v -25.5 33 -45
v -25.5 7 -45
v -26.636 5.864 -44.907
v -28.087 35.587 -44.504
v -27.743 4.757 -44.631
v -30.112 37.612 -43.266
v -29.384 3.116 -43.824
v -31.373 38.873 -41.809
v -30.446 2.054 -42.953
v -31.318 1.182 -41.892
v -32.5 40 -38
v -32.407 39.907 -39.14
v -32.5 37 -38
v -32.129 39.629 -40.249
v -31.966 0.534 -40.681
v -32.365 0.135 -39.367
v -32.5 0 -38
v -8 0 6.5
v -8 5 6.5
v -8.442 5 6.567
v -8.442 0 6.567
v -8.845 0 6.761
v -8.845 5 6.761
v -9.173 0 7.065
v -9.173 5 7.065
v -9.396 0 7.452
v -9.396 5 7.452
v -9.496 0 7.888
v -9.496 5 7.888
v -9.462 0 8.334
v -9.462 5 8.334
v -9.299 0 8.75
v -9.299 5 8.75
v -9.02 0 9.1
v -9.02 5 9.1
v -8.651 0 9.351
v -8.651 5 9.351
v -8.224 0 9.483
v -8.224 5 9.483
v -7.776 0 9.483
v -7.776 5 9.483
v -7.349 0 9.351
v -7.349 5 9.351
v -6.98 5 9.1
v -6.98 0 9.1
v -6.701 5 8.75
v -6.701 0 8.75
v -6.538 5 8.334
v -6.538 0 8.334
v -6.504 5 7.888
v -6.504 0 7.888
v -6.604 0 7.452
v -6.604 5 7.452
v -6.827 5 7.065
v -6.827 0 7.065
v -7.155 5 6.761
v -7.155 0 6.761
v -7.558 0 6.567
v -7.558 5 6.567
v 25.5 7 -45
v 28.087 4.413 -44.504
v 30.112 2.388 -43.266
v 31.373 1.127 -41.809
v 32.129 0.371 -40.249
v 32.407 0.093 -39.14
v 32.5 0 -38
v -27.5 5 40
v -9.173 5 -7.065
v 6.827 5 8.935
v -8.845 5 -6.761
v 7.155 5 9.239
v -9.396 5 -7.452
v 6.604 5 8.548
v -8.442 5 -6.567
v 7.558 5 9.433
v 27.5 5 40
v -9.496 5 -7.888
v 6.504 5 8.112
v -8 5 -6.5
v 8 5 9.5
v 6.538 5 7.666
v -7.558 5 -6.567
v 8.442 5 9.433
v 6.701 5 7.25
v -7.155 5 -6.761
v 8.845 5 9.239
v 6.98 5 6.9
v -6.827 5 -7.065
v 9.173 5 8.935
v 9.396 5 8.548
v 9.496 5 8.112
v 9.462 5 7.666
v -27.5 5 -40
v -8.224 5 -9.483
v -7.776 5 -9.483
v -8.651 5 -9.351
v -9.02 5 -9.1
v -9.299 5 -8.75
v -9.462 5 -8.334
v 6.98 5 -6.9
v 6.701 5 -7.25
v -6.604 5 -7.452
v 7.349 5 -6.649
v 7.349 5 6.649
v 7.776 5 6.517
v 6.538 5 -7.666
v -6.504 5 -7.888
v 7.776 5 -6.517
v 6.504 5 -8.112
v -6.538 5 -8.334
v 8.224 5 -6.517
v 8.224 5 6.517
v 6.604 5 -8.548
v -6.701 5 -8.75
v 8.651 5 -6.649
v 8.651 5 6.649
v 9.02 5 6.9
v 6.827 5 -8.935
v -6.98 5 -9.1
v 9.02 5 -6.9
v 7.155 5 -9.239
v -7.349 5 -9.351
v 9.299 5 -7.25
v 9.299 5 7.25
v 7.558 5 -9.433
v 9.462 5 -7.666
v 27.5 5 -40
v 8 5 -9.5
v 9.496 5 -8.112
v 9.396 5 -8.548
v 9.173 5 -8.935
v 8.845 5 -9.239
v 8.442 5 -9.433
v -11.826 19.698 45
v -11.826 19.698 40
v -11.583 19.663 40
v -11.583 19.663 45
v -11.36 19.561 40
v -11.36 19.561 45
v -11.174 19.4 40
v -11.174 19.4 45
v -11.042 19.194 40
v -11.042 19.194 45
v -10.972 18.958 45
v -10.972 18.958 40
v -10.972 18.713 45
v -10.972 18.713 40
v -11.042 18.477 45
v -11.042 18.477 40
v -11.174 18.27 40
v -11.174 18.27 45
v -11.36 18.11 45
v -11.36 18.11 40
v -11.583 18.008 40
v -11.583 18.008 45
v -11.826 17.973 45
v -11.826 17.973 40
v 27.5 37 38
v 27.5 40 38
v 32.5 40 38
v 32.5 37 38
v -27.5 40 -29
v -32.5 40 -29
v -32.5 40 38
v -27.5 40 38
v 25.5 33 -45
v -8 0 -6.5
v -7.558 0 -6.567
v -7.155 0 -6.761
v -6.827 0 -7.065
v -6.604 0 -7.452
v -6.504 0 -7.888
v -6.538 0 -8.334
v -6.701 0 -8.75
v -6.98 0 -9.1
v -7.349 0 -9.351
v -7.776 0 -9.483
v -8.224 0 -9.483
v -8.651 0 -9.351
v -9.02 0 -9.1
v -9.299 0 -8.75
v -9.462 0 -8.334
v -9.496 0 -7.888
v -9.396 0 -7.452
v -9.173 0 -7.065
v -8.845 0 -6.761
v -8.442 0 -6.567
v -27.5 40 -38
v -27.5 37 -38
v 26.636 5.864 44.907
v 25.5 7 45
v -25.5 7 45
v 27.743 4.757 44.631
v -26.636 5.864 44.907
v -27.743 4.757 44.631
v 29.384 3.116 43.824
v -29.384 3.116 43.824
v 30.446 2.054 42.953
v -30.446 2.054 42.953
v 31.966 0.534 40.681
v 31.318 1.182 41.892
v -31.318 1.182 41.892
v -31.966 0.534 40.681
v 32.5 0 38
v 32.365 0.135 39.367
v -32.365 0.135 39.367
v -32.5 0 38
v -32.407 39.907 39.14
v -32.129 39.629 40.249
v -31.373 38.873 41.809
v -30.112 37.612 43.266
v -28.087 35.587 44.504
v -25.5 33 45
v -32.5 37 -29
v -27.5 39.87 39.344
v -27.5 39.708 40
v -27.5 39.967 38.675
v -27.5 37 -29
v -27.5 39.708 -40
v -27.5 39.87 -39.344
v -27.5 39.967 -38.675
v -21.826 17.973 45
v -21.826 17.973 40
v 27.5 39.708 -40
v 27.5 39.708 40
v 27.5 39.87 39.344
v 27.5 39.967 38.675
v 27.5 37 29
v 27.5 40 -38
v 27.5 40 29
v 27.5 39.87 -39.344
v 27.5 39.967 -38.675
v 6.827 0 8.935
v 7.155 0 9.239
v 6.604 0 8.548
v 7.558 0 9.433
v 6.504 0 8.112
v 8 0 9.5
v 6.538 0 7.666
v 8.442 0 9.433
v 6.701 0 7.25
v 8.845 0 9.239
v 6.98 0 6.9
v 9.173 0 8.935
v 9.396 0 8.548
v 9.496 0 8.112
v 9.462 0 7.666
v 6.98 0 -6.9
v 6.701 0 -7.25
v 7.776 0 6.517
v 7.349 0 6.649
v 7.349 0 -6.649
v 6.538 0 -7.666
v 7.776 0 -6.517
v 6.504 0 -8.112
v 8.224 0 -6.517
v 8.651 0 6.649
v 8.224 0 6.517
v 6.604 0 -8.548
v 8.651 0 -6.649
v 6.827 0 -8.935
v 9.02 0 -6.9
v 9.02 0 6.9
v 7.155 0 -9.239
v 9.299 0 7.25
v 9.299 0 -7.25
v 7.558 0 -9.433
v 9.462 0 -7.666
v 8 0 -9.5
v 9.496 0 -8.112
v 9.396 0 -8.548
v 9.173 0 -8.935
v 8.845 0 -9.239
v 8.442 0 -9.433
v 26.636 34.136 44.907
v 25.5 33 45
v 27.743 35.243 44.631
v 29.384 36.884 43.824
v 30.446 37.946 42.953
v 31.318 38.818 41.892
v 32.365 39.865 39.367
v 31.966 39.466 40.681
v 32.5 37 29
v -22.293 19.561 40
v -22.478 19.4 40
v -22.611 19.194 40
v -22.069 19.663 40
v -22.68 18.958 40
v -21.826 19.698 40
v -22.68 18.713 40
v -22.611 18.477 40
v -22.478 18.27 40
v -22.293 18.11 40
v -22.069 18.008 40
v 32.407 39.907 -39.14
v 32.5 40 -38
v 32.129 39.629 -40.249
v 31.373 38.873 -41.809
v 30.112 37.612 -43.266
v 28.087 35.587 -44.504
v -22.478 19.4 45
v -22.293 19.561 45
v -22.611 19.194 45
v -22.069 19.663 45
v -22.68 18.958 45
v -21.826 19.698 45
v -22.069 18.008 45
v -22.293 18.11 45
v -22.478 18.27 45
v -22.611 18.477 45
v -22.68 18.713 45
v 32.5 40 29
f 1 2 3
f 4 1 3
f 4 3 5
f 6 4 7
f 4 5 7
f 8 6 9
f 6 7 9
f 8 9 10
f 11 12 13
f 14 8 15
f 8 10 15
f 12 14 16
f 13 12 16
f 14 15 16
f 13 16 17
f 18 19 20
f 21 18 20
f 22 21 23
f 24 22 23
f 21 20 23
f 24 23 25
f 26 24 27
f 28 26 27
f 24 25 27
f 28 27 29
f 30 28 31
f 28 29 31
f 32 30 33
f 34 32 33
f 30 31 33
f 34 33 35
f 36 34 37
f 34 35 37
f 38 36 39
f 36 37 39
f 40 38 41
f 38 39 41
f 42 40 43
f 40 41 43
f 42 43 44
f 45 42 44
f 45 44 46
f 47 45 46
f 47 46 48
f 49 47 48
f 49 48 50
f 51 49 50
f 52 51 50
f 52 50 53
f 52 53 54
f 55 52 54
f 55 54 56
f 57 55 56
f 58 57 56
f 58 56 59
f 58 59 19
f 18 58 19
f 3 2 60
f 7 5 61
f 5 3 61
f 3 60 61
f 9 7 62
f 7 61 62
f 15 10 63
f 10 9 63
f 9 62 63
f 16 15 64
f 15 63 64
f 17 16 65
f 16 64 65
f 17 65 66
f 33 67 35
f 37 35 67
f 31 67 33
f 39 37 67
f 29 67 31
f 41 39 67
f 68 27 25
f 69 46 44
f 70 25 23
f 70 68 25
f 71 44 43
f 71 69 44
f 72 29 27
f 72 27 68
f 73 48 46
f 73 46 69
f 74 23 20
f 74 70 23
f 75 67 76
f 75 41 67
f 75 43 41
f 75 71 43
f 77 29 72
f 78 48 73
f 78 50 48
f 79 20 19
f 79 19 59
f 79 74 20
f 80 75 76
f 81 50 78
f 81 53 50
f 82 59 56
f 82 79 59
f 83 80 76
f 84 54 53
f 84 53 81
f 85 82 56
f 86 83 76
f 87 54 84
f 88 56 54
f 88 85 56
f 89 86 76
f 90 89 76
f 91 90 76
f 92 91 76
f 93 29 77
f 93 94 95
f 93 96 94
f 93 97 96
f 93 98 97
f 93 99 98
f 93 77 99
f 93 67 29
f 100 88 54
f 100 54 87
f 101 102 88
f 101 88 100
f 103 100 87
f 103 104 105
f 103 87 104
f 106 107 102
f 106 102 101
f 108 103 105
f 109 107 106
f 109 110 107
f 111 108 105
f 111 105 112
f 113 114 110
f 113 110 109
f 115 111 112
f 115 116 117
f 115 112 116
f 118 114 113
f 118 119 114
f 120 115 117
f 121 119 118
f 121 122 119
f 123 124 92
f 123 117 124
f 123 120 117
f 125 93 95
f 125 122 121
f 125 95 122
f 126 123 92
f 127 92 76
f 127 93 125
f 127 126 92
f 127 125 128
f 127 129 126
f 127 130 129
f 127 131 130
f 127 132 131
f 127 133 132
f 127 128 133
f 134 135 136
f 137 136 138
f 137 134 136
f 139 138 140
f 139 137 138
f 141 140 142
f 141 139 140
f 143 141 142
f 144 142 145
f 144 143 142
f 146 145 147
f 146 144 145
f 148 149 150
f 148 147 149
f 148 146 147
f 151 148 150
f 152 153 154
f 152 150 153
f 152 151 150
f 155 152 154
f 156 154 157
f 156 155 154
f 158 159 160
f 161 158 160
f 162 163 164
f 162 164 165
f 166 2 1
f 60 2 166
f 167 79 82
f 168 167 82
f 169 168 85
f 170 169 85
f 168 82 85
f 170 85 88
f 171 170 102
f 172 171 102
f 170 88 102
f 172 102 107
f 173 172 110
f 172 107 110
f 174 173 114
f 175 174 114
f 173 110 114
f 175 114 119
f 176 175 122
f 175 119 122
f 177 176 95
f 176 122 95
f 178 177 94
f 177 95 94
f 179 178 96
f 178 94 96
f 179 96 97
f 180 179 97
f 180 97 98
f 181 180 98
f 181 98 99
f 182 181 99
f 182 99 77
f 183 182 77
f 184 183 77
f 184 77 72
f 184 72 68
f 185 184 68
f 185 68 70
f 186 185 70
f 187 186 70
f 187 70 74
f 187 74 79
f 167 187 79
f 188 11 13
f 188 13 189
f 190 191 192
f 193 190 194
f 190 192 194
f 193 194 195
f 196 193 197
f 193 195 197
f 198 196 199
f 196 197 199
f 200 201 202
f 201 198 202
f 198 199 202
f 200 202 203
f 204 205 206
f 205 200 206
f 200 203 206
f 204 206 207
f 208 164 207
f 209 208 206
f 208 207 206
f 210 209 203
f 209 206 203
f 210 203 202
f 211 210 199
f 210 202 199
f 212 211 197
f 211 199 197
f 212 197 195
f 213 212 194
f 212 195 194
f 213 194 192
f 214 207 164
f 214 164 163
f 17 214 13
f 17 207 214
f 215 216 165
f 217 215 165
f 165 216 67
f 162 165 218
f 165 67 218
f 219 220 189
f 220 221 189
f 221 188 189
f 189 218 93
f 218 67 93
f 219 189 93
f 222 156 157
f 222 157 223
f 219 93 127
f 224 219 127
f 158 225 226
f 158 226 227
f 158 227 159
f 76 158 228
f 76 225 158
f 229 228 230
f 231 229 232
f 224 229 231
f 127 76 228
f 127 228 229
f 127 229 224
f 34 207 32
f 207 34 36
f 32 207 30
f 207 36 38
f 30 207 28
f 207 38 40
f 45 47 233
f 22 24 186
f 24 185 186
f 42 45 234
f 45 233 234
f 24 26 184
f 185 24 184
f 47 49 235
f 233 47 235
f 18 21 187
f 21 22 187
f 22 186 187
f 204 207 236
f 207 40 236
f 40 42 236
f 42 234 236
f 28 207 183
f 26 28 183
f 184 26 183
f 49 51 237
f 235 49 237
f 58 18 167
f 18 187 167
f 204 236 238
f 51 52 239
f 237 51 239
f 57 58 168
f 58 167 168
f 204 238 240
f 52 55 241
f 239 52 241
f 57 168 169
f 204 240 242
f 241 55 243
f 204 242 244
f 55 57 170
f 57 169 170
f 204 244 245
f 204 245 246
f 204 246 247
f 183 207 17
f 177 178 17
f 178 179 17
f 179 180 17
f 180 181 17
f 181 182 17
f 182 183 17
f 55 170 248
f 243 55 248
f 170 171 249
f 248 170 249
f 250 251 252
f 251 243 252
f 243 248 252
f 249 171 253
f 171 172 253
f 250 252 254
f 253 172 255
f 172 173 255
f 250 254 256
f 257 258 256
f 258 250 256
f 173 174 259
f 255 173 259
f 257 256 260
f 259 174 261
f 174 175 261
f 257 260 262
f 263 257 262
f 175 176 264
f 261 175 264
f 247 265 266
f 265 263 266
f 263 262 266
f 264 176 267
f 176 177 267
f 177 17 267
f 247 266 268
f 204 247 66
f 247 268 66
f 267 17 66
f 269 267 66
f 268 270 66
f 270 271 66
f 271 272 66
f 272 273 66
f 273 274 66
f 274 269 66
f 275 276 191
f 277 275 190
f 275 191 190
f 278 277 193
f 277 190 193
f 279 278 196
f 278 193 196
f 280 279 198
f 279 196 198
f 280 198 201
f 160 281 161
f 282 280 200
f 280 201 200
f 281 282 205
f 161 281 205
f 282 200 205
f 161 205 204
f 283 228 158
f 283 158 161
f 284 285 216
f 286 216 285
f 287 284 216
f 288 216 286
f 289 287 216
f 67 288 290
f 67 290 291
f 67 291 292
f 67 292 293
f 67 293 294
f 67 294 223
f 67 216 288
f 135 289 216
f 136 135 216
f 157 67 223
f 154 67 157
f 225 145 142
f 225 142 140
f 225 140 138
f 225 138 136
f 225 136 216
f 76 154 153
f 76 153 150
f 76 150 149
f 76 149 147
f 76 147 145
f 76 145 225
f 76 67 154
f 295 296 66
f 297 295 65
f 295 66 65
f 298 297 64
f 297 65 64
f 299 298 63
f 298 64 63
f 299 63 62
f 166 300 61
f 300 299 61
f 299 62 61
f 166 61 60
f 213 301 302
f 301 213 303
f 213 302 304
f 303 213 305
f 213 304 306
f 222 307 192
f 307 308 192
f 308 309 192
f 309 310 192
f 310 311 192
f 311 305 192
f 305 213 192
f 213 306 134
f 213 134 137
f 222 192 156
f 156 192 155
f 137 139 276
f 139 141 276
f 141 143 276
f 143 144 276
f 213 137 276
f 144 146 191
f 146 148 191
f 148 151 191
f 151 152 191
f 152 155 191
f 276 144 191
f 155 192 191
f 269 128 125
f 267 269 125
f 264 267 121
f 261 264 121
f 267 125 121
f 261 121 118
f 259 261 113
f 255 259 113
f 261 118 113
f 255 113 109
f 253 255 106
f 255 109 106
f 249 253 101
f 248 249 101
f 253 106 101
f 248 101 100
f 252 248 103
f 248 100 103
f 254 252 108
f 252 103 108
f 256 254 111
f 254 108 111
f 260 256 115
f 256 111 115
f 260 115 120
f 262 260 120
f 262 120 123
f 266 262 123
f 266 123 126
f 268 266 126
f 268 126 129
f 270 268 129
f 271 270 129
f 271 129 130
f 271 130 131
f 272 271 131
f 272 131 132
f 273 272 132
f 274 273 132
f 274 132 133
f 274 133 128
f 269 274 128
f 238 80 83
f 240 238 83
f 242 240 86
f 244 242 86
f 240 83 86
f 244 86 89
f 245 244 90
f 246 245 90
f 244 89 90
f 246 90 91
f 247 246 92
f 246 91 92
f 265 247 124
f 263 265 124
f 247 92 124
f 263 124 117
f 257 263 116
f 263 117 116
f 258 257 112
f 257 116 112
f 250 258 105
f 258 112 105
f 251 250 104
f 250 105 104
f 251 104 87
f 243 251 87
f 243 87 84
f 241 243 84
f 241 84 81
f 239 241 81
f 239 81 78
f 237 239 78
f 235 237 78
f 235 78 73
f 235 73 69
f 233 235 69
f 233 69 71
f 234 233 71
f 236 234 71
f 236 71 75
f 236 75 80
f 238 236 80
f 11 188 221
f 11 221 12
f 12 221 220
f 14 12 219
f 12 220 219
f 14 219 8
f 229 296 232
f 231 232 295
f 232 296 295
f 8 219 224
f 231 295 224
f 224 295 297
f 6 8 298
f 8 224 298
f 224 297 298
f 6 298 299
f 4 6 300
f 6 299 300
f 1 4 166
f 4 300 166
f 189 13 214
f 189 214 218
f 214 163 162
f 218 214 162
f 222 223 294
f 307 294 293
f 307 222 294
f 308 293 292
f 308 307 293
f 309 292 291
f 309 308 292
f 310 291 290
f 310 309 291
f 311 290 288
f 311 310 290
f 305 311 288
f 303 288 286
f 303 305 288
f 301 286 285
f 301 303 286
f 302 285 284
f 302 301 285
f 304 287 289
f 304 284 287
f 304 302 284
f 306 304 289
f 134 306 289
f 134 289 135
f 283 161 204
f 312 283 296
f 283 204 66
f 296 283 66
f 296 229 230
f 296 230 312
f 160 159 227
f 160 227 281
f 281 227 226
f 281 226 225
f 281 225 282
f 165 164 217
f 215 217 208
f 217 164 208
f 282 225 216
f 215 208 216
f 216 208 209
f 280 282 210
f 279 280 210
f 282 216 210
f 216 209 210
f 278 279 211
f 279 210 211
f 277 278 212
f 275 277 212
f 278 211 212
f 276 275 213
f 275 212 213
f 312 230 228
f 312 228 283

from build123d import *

# Parameters (mm, degrees)
ESBO_O3_W                = 65
ESBO_O3_H                = 90
RESSALTO_EXTRUS_O2_DEPTH = 40
CASCA2_T                 = -5
ESBO_O4_R                = 1.5
CORTE_EXTRUS_O1_DEPTH    = 40
FILETE2_R                = 7
ESBO_O5_W                = 5
ESBO_O5_H                = 9
CORTE_EXTRUS_O2_DEPTH    = 3
ESBO_O7_W                = 5
ESBO_O7_H                = 9
CORTE_EXTRUS_O3_DEPTH    = 3
CORTE_EXTRUS_O4_REACH    = 105.712


with BuildPart() as part:
    # Esboço3 → Ressalto-extrusão2 (new body)
    with BuildSketch(Plane(origin=(0, 0, 0), x_dir=(1, 0, 0), z_dir=(0, 1, 0))):
        Rectangle(ESBO_O3_W, ESBO_O3_H)
    extrude(amount=RESSALTO_EXTRUS_O2_DEPTH)

    # Casca2
    casca2_openings = [part.faces().sort_by_distance(p)[0] for p in [
        (0, 40, 0),
    ]]
    offset(amount=CASCA2_T, openings=casca2_openings, kind=Kind.INTERSECTION)

    # Esboço4 → Corte-extrusão1 (cut)
    with BuildSketch(Plane(origin=(0, 5, 0), x_dir=(1, 0, 0), z_dir=(0, 1, 0))):
        with Locations(Location((-8, 8, 0), (0, 0, 270))):
            Circle(ESBO_O4_R)
        with Locations(Location((8, 8, 0), (0, 0, 90))):
            Circle(ESBO_O4_R)
        with Locations(Location((8, -8, 0), (0, 0, 270))):
            Circle(ESBO_O4_R)
        with Locations(Location((-8, -8, 0), (0, 0, 90))):
            Circle(ESBO_O4_R)
    extrude(amount=-CORTE_EXTRUS_O1_DEPTH, mode=Mode.SUBTRACT)

    # Filete2
    # the kernel refuses this fillet: 7 mm, written as the material it takes off along each edge
    with BuildSketch(Plane(origin=(32.5, -17.5, -45), x_dir=(0, 0, 1), z_dir=(0, 1, 0)), Plane(origin=(32.5, -17.5, 45), x_dir=(-1, 0, 0), z_dir=(0, 1, 0))) as filete2_piece_1:
        with BuildLine():
            CenterArc((FILETE2_R, -FILETE2_R), FILETE2_R, 90, 90)
            Line((0, -FILETE2_R), (0, 0))
            Line((0, 0), (FILETE2_R, 0))
        make_face()
    extrude(amount=75, mode=Mode.SUBTRACT)
    with BuildSketch(Plane(origin=(50, 40, -45), x_dir=(0, 0, 1), z_dir=(-1, 0, 0)), Plane(origin=(-50, 0, 45), x_dir=(0, 1, 0), z_dir=(1, 0, 0))) as filete2_piece_2:
        with BuildLine():
            CenterArc((FILETE2_R, -FILETE2_R), FILETE2_R, 90, 90)
            Line((0, -FILETE2_R), (0, 0))
            Line((0, 0), (FILETE2_R, 0))
        make_face()
    extrude(amount=100, mode=Mode.SUBTRACT)
    with BuildSketch(Plane(origin=(-32.5, -17.5, -45), x_dir=(0, 0, 1), z_dir=(0, 1, 0)), Plane(origin=(-32.5, -17.5, 45), x_dir=(1, 0, 0), z_dir=(0, 1, 0))) as filete2_piece_3:
        with BuildLine():
            CenterArc((FILETE2_R, FILETE2_R), FILETE2_R, 180, 90)
            Line((0, FILETE2_R), (0, 0))
            Line((0, 0), (FILETE2_R, 0))
        make_face()
    extrude(amount=75, mode=Mode.SUBTRACT)
    with BuildSketch(Plane(origin=(50, 0, -45), x_dir=(0, 0, 1), z_dir=(-1, 0, 0)), Plane(origin=(-50, 40, 45), x_dir=(0, -1, 0), z_dir=(1, 0, 0))) as filete2_piece_4:
        with BuildLine():
            CenterArc((FILETE2_R, FILETE2_R), FILETE2_R, 180, 90)
            Line((0, FILETE2_R), (0, 0))
            Line((0, 0), (FILETE2_R, 0))
        make_face()
    extrude(amount=100, mode=Mode.SUBTRACT)

    # Esboço5 → Corte-extrusão2 (cut)
    with BuildSketch(Plane(origin=(0, 40, 0), x_dir=(1, 0, 0), z_dir=(0, 1, 0))):
        with Locations((-30, 33.5)):
            Rectangle(ESBO_O5_W, ESBO_O5_H)
    extrude(amount=-CORTE_EXTRUS_O2_DEPTH, mode=Mode.SUBTRACT)

    # Esboço7 → Corte-extrusão3 (cut)
    with BuildSketch(Plane(origin=(0, 40, 0), x_dir=(1, 0, 0), z_dir=(0, 1, 0))):
        with Locations((30, -33.5)):
            Rectangle(ESBO_O7_W, ESBO_O7_H)
    extrude(amount=-CORTE_EXTRUS_O3_DEPTH, mode=Mode.SUBTRACT)

    # Esboço8 → Corte-extrusão4 (cut, up to next)
    with BuildSketch(Plane.XY.offset(45), mode=Mode.PRIVATE) as corte_extrus_o4_sk1:
        with BuildLine():
            Line((-21.8264162, 19.698053531), (-11.8264162, 19.698053531))
            ThreePointArc((-11.8264162, 19.698053531), (-10.963712002, 18.835349333), (-11.8264162, 17.972645136))
            Line((-11.8264162, 17.972645136), (-21.8264162, 17.972645136))
            ThreePointArc((-21.8264162, 17.972645136), (-22.689120398, 18.835349333), (-21.8264162, 19.698053531))
        make_face()
    corte_extrus_o4_tool1 = extrude(corte_extrus_o4_sk1.sketch, amount=-CORTE_EXTRUS_O4_REACH, mode=Mode.PRIVATE) & part.part
    add(corte_extrus_o4_tool1.solids().sort_by_distance((-16.826416, 18.835349, 45))[0], mode=Mode.SUBTRACT)


solid = part.part
